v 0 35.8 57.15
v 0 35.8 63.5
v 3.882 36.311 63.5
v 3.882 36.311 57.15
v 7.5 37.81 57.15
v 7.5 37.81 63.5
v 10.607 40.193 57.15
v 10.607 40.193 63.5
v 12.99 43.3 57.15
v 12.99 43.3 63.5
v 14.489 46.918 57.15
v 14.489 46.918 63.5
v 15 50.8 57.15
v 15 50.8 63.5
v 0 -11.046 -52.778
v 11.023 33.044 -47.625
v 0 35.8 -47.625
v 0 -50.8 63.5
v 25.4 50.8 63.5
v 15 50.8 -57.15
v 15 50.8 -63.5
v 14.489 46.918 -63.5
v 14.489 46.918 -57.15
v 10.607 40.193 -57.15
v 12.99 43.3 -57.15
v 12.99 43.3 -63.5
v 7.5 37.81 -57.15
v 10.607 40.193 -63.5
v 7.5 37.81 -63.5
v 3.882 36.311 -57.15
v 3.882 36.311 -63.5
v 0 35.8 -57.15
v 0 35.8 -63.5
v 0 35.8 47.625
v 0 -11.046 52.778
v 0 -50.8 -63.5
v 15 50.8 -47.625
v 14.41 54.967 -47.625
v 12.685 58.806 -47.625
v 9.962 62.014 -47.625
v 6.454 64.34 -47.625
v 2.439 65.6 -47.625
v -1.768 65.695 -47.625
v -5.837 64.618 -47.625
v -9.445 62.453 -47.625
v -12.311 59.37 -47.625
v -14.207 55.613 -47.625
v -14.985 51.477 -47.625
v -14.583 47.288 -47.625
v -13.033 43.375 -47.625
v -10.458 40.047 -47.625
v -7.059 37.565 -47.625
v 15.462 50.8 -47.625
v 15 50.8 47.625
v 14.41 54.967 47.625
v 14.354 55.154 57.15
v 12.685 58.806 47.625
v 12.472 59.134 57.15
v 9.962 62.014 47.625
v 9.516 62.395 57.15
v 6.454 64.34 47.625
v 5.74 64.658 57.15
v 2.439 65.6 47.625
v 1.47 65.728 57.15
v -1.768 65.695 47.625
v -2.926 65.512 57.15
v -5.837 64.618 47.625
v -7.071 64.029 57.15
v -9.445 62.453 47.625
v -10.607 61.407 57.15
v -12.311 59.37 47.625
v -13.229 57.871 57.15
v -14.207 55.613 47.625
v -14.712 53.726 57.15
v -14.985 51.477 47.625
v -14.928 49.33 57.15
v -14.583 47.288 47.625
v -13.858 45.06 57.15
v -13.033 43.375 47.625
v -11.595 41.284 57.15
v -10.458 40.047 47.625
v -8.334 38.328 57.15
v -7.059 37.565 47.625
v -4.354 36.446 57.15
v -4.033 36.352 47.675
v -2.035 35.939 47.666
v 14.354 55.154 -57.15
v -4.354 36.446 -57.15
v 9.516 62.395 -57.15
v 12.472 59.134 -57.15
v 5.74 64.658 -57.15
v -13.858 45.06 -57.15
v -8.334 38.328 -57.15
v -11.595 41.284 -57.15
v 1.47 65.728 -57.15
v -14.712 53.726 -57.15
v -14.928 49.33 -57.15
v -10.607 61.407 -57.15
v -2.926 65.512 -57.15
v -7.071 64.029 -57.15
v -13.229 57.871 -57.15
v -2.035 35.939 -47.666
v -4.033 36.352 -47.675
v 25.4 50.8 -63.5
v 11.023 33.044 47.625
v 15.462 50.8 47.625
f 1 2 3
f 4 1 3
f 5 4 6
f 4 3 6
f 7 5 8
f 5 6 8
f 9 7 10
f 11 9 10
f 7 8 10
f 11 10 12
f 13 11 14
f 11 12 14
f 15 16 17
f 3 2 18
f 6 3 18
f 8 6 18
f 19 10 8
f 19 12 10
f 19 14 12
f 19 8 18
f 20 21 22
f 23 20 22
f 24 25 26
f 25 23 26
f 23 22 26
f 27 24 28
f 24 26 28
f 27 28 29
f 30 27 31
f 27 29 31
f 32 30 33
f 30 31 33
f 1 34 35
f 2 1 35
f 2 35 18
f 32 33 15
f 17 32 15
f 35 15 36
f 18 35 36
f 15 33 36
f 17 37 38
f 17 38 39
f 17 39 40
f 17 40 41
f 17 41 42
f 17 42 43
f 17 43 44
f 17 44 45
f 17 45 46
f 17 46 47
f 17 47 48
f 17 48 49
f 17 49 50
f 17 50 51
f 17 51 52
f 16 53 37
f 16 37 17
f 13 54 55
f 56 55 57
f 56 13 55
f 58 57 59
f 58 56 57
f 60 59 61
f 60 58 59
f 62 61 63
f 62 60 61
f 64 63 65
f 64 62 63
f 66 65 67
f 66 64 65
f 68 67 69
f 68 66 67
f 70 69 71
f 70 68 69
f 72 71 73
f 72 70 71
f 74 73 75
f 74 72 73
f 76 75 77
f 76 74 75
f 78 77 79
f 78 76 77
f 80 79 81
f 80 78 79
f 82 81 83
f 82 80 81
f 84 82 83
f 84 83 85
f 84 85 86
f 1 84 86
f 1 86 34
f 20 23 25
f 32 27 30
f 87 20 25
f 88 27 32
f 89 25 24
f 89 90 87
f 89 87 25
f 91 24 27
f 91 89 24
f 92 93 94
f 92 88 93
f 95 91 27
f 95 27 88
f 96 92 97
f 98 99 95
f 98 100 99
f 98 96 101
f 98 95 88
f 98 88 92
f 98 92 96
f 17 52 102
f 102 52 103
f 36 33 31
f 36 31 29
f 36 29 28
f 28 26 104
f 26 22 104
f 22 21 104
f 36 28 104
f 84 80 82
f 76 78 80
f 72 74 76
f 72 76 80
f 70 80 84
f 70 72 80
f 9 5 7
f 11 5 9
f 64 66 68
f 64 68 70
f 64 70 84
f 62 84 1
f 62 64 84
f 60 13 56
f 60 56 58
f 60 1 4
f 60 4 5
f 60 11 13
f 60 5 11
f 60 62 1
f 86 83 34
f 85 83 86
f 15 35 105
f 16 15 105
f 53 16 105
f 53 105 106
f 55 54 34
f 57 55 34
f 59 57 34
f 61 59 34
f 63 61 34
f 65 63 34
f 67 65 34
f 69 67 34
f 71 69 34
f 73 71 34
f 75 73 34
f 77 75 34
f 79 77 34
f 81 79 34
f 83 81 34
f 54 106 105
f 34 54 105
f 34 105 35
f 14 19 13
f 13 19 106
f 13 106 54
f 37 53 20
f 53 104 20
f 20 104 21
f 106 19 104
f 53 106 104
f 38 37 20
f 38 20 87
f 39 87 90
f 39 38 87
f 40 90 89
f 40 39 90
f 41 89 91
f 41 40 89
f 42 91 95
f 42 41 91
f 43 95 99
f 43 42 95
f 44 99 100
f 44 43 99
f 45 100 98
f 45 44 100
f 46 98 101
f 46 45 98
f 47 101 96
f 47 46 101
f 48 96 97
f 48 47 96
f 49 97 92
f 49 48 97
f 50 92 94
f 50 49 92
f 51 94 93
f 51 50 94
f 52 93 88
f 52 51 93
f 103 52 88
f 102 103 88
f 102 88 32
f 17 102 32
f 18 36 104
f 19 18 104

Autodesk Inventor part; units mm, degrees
ref_plane "YZ Plane" through (0, 0, 0) normal (1, 0, 0) x (0, 1, 0)
ref_plane "XZ Plane" through (0, 0, 0) normal (0, 1, 0) x (-1, 0, 0)
ref_plane "XY Plane" through (0, 0, 0) normal (0, 0, 1) x (1, 0, 0)
sketch "Sketch1" plane through (0, 0, 0) normal (0, 0, 1) x (1, 0, 0)
  line L0 (0, 50.8) -> (0, -50.8)
  line L1 (0, -50.8) -> (25.4, 50.8)
  line L2 (25.4, 50.8) -> (0, 50.8)
  point P0 (0, 0)
  point P1 (0, 0)
  dimension "d0" = 101.6
  dimension "d2" = 25.4
extrude "Extrusion1" add sketch "Sketch1" along normal mid plane 127
sketch "Sketch2" plane through (0, 0, 0) normal (0, 0, 1) x (1, 0, 0)
  line L0 (0, 50.8) -> (0, -50.8) projected
  circle A0 centre (0, 50.8) radius 15
  point P0 (0, 0)
  dimension "d5" = 30
extrude "Extrusion2" add sketch "Sketch2" along normal mid plane 114.3
sketch "Sketch3" plane through (0, 0, 63.5) normal (0, 0, 1) x (1, 0, 0)
  line L0 (0, 50.8) -> (0, -50.8) projected
  line L1 (0, 50.8) -> (25.4, 50.8) projected
  arc A0 (0, 35.8) -> (15, 50.8) centre (0, 50.8) ccw
  arc A1 (15, 50.8) -> (0, 35.8) centre (0, 50.8) ccw projected
  point P0 (0, 0)
extrude "Extrusion3" cut sketch "Sketch3" against normal up to surface (6.35 mm away) contours L1 A0 L0
mirror "Mirror1" about plane through (0, 0, 0) normal (0, 0, 1) of "Extrusion3"
ref_plane "Work Plane1" through (14.5521, 47.162, 0) normal (0.9701425, -0.2425356, 0) x (0.2425356, 0.9701425, 0)
sketch "Sketch4" plane through (14.5521, 47.162, 0) normal (0.9701425, -0.2425356, 0) x (0.2425356, 0.9701425, 0)
  line L0 (15, -57.15) -> (15, 57.15) projected
  line L1 (15, 47.625) -> (-14.5521, 47.625)
  line L2 (-14.5521, 47.625) -> (-98.5665, 57.15)
  line L3 (-98.5665, -63.5) -> (-98.5665, 63.5) projected
  line L4 (15, 0) -> (-98.5665, 0) construction
  line L5 (15, 57.15) -> (-15, 57.15) construction
  line L6 (-15, -57.15) -> (-15, 57.15) construction
  line L7 (-14.5521, 57.15) -> (-14.5521, -57.15) construction
  line L8 (15, -47.625) -> (-14.5521, -47.625)
  line L9 (-14.5521, -47.625) -> (-98.5665, -57.15)
  line L10 (15, 47.625) -> (15, -47.625)
  line L11 (-98.5665, 57.15) -> (-98.5665, -57.15)
  point P0 (-49.2832, 0)
  point P1 (3.638, 57.15)
  dimension "d10" = 6.35
  dimension "d11" = 9.525
extrude "Extrusion4" cut sketch "Sketch4" against normal through all
properties part number "NASA-20-ARM-SH-01"
